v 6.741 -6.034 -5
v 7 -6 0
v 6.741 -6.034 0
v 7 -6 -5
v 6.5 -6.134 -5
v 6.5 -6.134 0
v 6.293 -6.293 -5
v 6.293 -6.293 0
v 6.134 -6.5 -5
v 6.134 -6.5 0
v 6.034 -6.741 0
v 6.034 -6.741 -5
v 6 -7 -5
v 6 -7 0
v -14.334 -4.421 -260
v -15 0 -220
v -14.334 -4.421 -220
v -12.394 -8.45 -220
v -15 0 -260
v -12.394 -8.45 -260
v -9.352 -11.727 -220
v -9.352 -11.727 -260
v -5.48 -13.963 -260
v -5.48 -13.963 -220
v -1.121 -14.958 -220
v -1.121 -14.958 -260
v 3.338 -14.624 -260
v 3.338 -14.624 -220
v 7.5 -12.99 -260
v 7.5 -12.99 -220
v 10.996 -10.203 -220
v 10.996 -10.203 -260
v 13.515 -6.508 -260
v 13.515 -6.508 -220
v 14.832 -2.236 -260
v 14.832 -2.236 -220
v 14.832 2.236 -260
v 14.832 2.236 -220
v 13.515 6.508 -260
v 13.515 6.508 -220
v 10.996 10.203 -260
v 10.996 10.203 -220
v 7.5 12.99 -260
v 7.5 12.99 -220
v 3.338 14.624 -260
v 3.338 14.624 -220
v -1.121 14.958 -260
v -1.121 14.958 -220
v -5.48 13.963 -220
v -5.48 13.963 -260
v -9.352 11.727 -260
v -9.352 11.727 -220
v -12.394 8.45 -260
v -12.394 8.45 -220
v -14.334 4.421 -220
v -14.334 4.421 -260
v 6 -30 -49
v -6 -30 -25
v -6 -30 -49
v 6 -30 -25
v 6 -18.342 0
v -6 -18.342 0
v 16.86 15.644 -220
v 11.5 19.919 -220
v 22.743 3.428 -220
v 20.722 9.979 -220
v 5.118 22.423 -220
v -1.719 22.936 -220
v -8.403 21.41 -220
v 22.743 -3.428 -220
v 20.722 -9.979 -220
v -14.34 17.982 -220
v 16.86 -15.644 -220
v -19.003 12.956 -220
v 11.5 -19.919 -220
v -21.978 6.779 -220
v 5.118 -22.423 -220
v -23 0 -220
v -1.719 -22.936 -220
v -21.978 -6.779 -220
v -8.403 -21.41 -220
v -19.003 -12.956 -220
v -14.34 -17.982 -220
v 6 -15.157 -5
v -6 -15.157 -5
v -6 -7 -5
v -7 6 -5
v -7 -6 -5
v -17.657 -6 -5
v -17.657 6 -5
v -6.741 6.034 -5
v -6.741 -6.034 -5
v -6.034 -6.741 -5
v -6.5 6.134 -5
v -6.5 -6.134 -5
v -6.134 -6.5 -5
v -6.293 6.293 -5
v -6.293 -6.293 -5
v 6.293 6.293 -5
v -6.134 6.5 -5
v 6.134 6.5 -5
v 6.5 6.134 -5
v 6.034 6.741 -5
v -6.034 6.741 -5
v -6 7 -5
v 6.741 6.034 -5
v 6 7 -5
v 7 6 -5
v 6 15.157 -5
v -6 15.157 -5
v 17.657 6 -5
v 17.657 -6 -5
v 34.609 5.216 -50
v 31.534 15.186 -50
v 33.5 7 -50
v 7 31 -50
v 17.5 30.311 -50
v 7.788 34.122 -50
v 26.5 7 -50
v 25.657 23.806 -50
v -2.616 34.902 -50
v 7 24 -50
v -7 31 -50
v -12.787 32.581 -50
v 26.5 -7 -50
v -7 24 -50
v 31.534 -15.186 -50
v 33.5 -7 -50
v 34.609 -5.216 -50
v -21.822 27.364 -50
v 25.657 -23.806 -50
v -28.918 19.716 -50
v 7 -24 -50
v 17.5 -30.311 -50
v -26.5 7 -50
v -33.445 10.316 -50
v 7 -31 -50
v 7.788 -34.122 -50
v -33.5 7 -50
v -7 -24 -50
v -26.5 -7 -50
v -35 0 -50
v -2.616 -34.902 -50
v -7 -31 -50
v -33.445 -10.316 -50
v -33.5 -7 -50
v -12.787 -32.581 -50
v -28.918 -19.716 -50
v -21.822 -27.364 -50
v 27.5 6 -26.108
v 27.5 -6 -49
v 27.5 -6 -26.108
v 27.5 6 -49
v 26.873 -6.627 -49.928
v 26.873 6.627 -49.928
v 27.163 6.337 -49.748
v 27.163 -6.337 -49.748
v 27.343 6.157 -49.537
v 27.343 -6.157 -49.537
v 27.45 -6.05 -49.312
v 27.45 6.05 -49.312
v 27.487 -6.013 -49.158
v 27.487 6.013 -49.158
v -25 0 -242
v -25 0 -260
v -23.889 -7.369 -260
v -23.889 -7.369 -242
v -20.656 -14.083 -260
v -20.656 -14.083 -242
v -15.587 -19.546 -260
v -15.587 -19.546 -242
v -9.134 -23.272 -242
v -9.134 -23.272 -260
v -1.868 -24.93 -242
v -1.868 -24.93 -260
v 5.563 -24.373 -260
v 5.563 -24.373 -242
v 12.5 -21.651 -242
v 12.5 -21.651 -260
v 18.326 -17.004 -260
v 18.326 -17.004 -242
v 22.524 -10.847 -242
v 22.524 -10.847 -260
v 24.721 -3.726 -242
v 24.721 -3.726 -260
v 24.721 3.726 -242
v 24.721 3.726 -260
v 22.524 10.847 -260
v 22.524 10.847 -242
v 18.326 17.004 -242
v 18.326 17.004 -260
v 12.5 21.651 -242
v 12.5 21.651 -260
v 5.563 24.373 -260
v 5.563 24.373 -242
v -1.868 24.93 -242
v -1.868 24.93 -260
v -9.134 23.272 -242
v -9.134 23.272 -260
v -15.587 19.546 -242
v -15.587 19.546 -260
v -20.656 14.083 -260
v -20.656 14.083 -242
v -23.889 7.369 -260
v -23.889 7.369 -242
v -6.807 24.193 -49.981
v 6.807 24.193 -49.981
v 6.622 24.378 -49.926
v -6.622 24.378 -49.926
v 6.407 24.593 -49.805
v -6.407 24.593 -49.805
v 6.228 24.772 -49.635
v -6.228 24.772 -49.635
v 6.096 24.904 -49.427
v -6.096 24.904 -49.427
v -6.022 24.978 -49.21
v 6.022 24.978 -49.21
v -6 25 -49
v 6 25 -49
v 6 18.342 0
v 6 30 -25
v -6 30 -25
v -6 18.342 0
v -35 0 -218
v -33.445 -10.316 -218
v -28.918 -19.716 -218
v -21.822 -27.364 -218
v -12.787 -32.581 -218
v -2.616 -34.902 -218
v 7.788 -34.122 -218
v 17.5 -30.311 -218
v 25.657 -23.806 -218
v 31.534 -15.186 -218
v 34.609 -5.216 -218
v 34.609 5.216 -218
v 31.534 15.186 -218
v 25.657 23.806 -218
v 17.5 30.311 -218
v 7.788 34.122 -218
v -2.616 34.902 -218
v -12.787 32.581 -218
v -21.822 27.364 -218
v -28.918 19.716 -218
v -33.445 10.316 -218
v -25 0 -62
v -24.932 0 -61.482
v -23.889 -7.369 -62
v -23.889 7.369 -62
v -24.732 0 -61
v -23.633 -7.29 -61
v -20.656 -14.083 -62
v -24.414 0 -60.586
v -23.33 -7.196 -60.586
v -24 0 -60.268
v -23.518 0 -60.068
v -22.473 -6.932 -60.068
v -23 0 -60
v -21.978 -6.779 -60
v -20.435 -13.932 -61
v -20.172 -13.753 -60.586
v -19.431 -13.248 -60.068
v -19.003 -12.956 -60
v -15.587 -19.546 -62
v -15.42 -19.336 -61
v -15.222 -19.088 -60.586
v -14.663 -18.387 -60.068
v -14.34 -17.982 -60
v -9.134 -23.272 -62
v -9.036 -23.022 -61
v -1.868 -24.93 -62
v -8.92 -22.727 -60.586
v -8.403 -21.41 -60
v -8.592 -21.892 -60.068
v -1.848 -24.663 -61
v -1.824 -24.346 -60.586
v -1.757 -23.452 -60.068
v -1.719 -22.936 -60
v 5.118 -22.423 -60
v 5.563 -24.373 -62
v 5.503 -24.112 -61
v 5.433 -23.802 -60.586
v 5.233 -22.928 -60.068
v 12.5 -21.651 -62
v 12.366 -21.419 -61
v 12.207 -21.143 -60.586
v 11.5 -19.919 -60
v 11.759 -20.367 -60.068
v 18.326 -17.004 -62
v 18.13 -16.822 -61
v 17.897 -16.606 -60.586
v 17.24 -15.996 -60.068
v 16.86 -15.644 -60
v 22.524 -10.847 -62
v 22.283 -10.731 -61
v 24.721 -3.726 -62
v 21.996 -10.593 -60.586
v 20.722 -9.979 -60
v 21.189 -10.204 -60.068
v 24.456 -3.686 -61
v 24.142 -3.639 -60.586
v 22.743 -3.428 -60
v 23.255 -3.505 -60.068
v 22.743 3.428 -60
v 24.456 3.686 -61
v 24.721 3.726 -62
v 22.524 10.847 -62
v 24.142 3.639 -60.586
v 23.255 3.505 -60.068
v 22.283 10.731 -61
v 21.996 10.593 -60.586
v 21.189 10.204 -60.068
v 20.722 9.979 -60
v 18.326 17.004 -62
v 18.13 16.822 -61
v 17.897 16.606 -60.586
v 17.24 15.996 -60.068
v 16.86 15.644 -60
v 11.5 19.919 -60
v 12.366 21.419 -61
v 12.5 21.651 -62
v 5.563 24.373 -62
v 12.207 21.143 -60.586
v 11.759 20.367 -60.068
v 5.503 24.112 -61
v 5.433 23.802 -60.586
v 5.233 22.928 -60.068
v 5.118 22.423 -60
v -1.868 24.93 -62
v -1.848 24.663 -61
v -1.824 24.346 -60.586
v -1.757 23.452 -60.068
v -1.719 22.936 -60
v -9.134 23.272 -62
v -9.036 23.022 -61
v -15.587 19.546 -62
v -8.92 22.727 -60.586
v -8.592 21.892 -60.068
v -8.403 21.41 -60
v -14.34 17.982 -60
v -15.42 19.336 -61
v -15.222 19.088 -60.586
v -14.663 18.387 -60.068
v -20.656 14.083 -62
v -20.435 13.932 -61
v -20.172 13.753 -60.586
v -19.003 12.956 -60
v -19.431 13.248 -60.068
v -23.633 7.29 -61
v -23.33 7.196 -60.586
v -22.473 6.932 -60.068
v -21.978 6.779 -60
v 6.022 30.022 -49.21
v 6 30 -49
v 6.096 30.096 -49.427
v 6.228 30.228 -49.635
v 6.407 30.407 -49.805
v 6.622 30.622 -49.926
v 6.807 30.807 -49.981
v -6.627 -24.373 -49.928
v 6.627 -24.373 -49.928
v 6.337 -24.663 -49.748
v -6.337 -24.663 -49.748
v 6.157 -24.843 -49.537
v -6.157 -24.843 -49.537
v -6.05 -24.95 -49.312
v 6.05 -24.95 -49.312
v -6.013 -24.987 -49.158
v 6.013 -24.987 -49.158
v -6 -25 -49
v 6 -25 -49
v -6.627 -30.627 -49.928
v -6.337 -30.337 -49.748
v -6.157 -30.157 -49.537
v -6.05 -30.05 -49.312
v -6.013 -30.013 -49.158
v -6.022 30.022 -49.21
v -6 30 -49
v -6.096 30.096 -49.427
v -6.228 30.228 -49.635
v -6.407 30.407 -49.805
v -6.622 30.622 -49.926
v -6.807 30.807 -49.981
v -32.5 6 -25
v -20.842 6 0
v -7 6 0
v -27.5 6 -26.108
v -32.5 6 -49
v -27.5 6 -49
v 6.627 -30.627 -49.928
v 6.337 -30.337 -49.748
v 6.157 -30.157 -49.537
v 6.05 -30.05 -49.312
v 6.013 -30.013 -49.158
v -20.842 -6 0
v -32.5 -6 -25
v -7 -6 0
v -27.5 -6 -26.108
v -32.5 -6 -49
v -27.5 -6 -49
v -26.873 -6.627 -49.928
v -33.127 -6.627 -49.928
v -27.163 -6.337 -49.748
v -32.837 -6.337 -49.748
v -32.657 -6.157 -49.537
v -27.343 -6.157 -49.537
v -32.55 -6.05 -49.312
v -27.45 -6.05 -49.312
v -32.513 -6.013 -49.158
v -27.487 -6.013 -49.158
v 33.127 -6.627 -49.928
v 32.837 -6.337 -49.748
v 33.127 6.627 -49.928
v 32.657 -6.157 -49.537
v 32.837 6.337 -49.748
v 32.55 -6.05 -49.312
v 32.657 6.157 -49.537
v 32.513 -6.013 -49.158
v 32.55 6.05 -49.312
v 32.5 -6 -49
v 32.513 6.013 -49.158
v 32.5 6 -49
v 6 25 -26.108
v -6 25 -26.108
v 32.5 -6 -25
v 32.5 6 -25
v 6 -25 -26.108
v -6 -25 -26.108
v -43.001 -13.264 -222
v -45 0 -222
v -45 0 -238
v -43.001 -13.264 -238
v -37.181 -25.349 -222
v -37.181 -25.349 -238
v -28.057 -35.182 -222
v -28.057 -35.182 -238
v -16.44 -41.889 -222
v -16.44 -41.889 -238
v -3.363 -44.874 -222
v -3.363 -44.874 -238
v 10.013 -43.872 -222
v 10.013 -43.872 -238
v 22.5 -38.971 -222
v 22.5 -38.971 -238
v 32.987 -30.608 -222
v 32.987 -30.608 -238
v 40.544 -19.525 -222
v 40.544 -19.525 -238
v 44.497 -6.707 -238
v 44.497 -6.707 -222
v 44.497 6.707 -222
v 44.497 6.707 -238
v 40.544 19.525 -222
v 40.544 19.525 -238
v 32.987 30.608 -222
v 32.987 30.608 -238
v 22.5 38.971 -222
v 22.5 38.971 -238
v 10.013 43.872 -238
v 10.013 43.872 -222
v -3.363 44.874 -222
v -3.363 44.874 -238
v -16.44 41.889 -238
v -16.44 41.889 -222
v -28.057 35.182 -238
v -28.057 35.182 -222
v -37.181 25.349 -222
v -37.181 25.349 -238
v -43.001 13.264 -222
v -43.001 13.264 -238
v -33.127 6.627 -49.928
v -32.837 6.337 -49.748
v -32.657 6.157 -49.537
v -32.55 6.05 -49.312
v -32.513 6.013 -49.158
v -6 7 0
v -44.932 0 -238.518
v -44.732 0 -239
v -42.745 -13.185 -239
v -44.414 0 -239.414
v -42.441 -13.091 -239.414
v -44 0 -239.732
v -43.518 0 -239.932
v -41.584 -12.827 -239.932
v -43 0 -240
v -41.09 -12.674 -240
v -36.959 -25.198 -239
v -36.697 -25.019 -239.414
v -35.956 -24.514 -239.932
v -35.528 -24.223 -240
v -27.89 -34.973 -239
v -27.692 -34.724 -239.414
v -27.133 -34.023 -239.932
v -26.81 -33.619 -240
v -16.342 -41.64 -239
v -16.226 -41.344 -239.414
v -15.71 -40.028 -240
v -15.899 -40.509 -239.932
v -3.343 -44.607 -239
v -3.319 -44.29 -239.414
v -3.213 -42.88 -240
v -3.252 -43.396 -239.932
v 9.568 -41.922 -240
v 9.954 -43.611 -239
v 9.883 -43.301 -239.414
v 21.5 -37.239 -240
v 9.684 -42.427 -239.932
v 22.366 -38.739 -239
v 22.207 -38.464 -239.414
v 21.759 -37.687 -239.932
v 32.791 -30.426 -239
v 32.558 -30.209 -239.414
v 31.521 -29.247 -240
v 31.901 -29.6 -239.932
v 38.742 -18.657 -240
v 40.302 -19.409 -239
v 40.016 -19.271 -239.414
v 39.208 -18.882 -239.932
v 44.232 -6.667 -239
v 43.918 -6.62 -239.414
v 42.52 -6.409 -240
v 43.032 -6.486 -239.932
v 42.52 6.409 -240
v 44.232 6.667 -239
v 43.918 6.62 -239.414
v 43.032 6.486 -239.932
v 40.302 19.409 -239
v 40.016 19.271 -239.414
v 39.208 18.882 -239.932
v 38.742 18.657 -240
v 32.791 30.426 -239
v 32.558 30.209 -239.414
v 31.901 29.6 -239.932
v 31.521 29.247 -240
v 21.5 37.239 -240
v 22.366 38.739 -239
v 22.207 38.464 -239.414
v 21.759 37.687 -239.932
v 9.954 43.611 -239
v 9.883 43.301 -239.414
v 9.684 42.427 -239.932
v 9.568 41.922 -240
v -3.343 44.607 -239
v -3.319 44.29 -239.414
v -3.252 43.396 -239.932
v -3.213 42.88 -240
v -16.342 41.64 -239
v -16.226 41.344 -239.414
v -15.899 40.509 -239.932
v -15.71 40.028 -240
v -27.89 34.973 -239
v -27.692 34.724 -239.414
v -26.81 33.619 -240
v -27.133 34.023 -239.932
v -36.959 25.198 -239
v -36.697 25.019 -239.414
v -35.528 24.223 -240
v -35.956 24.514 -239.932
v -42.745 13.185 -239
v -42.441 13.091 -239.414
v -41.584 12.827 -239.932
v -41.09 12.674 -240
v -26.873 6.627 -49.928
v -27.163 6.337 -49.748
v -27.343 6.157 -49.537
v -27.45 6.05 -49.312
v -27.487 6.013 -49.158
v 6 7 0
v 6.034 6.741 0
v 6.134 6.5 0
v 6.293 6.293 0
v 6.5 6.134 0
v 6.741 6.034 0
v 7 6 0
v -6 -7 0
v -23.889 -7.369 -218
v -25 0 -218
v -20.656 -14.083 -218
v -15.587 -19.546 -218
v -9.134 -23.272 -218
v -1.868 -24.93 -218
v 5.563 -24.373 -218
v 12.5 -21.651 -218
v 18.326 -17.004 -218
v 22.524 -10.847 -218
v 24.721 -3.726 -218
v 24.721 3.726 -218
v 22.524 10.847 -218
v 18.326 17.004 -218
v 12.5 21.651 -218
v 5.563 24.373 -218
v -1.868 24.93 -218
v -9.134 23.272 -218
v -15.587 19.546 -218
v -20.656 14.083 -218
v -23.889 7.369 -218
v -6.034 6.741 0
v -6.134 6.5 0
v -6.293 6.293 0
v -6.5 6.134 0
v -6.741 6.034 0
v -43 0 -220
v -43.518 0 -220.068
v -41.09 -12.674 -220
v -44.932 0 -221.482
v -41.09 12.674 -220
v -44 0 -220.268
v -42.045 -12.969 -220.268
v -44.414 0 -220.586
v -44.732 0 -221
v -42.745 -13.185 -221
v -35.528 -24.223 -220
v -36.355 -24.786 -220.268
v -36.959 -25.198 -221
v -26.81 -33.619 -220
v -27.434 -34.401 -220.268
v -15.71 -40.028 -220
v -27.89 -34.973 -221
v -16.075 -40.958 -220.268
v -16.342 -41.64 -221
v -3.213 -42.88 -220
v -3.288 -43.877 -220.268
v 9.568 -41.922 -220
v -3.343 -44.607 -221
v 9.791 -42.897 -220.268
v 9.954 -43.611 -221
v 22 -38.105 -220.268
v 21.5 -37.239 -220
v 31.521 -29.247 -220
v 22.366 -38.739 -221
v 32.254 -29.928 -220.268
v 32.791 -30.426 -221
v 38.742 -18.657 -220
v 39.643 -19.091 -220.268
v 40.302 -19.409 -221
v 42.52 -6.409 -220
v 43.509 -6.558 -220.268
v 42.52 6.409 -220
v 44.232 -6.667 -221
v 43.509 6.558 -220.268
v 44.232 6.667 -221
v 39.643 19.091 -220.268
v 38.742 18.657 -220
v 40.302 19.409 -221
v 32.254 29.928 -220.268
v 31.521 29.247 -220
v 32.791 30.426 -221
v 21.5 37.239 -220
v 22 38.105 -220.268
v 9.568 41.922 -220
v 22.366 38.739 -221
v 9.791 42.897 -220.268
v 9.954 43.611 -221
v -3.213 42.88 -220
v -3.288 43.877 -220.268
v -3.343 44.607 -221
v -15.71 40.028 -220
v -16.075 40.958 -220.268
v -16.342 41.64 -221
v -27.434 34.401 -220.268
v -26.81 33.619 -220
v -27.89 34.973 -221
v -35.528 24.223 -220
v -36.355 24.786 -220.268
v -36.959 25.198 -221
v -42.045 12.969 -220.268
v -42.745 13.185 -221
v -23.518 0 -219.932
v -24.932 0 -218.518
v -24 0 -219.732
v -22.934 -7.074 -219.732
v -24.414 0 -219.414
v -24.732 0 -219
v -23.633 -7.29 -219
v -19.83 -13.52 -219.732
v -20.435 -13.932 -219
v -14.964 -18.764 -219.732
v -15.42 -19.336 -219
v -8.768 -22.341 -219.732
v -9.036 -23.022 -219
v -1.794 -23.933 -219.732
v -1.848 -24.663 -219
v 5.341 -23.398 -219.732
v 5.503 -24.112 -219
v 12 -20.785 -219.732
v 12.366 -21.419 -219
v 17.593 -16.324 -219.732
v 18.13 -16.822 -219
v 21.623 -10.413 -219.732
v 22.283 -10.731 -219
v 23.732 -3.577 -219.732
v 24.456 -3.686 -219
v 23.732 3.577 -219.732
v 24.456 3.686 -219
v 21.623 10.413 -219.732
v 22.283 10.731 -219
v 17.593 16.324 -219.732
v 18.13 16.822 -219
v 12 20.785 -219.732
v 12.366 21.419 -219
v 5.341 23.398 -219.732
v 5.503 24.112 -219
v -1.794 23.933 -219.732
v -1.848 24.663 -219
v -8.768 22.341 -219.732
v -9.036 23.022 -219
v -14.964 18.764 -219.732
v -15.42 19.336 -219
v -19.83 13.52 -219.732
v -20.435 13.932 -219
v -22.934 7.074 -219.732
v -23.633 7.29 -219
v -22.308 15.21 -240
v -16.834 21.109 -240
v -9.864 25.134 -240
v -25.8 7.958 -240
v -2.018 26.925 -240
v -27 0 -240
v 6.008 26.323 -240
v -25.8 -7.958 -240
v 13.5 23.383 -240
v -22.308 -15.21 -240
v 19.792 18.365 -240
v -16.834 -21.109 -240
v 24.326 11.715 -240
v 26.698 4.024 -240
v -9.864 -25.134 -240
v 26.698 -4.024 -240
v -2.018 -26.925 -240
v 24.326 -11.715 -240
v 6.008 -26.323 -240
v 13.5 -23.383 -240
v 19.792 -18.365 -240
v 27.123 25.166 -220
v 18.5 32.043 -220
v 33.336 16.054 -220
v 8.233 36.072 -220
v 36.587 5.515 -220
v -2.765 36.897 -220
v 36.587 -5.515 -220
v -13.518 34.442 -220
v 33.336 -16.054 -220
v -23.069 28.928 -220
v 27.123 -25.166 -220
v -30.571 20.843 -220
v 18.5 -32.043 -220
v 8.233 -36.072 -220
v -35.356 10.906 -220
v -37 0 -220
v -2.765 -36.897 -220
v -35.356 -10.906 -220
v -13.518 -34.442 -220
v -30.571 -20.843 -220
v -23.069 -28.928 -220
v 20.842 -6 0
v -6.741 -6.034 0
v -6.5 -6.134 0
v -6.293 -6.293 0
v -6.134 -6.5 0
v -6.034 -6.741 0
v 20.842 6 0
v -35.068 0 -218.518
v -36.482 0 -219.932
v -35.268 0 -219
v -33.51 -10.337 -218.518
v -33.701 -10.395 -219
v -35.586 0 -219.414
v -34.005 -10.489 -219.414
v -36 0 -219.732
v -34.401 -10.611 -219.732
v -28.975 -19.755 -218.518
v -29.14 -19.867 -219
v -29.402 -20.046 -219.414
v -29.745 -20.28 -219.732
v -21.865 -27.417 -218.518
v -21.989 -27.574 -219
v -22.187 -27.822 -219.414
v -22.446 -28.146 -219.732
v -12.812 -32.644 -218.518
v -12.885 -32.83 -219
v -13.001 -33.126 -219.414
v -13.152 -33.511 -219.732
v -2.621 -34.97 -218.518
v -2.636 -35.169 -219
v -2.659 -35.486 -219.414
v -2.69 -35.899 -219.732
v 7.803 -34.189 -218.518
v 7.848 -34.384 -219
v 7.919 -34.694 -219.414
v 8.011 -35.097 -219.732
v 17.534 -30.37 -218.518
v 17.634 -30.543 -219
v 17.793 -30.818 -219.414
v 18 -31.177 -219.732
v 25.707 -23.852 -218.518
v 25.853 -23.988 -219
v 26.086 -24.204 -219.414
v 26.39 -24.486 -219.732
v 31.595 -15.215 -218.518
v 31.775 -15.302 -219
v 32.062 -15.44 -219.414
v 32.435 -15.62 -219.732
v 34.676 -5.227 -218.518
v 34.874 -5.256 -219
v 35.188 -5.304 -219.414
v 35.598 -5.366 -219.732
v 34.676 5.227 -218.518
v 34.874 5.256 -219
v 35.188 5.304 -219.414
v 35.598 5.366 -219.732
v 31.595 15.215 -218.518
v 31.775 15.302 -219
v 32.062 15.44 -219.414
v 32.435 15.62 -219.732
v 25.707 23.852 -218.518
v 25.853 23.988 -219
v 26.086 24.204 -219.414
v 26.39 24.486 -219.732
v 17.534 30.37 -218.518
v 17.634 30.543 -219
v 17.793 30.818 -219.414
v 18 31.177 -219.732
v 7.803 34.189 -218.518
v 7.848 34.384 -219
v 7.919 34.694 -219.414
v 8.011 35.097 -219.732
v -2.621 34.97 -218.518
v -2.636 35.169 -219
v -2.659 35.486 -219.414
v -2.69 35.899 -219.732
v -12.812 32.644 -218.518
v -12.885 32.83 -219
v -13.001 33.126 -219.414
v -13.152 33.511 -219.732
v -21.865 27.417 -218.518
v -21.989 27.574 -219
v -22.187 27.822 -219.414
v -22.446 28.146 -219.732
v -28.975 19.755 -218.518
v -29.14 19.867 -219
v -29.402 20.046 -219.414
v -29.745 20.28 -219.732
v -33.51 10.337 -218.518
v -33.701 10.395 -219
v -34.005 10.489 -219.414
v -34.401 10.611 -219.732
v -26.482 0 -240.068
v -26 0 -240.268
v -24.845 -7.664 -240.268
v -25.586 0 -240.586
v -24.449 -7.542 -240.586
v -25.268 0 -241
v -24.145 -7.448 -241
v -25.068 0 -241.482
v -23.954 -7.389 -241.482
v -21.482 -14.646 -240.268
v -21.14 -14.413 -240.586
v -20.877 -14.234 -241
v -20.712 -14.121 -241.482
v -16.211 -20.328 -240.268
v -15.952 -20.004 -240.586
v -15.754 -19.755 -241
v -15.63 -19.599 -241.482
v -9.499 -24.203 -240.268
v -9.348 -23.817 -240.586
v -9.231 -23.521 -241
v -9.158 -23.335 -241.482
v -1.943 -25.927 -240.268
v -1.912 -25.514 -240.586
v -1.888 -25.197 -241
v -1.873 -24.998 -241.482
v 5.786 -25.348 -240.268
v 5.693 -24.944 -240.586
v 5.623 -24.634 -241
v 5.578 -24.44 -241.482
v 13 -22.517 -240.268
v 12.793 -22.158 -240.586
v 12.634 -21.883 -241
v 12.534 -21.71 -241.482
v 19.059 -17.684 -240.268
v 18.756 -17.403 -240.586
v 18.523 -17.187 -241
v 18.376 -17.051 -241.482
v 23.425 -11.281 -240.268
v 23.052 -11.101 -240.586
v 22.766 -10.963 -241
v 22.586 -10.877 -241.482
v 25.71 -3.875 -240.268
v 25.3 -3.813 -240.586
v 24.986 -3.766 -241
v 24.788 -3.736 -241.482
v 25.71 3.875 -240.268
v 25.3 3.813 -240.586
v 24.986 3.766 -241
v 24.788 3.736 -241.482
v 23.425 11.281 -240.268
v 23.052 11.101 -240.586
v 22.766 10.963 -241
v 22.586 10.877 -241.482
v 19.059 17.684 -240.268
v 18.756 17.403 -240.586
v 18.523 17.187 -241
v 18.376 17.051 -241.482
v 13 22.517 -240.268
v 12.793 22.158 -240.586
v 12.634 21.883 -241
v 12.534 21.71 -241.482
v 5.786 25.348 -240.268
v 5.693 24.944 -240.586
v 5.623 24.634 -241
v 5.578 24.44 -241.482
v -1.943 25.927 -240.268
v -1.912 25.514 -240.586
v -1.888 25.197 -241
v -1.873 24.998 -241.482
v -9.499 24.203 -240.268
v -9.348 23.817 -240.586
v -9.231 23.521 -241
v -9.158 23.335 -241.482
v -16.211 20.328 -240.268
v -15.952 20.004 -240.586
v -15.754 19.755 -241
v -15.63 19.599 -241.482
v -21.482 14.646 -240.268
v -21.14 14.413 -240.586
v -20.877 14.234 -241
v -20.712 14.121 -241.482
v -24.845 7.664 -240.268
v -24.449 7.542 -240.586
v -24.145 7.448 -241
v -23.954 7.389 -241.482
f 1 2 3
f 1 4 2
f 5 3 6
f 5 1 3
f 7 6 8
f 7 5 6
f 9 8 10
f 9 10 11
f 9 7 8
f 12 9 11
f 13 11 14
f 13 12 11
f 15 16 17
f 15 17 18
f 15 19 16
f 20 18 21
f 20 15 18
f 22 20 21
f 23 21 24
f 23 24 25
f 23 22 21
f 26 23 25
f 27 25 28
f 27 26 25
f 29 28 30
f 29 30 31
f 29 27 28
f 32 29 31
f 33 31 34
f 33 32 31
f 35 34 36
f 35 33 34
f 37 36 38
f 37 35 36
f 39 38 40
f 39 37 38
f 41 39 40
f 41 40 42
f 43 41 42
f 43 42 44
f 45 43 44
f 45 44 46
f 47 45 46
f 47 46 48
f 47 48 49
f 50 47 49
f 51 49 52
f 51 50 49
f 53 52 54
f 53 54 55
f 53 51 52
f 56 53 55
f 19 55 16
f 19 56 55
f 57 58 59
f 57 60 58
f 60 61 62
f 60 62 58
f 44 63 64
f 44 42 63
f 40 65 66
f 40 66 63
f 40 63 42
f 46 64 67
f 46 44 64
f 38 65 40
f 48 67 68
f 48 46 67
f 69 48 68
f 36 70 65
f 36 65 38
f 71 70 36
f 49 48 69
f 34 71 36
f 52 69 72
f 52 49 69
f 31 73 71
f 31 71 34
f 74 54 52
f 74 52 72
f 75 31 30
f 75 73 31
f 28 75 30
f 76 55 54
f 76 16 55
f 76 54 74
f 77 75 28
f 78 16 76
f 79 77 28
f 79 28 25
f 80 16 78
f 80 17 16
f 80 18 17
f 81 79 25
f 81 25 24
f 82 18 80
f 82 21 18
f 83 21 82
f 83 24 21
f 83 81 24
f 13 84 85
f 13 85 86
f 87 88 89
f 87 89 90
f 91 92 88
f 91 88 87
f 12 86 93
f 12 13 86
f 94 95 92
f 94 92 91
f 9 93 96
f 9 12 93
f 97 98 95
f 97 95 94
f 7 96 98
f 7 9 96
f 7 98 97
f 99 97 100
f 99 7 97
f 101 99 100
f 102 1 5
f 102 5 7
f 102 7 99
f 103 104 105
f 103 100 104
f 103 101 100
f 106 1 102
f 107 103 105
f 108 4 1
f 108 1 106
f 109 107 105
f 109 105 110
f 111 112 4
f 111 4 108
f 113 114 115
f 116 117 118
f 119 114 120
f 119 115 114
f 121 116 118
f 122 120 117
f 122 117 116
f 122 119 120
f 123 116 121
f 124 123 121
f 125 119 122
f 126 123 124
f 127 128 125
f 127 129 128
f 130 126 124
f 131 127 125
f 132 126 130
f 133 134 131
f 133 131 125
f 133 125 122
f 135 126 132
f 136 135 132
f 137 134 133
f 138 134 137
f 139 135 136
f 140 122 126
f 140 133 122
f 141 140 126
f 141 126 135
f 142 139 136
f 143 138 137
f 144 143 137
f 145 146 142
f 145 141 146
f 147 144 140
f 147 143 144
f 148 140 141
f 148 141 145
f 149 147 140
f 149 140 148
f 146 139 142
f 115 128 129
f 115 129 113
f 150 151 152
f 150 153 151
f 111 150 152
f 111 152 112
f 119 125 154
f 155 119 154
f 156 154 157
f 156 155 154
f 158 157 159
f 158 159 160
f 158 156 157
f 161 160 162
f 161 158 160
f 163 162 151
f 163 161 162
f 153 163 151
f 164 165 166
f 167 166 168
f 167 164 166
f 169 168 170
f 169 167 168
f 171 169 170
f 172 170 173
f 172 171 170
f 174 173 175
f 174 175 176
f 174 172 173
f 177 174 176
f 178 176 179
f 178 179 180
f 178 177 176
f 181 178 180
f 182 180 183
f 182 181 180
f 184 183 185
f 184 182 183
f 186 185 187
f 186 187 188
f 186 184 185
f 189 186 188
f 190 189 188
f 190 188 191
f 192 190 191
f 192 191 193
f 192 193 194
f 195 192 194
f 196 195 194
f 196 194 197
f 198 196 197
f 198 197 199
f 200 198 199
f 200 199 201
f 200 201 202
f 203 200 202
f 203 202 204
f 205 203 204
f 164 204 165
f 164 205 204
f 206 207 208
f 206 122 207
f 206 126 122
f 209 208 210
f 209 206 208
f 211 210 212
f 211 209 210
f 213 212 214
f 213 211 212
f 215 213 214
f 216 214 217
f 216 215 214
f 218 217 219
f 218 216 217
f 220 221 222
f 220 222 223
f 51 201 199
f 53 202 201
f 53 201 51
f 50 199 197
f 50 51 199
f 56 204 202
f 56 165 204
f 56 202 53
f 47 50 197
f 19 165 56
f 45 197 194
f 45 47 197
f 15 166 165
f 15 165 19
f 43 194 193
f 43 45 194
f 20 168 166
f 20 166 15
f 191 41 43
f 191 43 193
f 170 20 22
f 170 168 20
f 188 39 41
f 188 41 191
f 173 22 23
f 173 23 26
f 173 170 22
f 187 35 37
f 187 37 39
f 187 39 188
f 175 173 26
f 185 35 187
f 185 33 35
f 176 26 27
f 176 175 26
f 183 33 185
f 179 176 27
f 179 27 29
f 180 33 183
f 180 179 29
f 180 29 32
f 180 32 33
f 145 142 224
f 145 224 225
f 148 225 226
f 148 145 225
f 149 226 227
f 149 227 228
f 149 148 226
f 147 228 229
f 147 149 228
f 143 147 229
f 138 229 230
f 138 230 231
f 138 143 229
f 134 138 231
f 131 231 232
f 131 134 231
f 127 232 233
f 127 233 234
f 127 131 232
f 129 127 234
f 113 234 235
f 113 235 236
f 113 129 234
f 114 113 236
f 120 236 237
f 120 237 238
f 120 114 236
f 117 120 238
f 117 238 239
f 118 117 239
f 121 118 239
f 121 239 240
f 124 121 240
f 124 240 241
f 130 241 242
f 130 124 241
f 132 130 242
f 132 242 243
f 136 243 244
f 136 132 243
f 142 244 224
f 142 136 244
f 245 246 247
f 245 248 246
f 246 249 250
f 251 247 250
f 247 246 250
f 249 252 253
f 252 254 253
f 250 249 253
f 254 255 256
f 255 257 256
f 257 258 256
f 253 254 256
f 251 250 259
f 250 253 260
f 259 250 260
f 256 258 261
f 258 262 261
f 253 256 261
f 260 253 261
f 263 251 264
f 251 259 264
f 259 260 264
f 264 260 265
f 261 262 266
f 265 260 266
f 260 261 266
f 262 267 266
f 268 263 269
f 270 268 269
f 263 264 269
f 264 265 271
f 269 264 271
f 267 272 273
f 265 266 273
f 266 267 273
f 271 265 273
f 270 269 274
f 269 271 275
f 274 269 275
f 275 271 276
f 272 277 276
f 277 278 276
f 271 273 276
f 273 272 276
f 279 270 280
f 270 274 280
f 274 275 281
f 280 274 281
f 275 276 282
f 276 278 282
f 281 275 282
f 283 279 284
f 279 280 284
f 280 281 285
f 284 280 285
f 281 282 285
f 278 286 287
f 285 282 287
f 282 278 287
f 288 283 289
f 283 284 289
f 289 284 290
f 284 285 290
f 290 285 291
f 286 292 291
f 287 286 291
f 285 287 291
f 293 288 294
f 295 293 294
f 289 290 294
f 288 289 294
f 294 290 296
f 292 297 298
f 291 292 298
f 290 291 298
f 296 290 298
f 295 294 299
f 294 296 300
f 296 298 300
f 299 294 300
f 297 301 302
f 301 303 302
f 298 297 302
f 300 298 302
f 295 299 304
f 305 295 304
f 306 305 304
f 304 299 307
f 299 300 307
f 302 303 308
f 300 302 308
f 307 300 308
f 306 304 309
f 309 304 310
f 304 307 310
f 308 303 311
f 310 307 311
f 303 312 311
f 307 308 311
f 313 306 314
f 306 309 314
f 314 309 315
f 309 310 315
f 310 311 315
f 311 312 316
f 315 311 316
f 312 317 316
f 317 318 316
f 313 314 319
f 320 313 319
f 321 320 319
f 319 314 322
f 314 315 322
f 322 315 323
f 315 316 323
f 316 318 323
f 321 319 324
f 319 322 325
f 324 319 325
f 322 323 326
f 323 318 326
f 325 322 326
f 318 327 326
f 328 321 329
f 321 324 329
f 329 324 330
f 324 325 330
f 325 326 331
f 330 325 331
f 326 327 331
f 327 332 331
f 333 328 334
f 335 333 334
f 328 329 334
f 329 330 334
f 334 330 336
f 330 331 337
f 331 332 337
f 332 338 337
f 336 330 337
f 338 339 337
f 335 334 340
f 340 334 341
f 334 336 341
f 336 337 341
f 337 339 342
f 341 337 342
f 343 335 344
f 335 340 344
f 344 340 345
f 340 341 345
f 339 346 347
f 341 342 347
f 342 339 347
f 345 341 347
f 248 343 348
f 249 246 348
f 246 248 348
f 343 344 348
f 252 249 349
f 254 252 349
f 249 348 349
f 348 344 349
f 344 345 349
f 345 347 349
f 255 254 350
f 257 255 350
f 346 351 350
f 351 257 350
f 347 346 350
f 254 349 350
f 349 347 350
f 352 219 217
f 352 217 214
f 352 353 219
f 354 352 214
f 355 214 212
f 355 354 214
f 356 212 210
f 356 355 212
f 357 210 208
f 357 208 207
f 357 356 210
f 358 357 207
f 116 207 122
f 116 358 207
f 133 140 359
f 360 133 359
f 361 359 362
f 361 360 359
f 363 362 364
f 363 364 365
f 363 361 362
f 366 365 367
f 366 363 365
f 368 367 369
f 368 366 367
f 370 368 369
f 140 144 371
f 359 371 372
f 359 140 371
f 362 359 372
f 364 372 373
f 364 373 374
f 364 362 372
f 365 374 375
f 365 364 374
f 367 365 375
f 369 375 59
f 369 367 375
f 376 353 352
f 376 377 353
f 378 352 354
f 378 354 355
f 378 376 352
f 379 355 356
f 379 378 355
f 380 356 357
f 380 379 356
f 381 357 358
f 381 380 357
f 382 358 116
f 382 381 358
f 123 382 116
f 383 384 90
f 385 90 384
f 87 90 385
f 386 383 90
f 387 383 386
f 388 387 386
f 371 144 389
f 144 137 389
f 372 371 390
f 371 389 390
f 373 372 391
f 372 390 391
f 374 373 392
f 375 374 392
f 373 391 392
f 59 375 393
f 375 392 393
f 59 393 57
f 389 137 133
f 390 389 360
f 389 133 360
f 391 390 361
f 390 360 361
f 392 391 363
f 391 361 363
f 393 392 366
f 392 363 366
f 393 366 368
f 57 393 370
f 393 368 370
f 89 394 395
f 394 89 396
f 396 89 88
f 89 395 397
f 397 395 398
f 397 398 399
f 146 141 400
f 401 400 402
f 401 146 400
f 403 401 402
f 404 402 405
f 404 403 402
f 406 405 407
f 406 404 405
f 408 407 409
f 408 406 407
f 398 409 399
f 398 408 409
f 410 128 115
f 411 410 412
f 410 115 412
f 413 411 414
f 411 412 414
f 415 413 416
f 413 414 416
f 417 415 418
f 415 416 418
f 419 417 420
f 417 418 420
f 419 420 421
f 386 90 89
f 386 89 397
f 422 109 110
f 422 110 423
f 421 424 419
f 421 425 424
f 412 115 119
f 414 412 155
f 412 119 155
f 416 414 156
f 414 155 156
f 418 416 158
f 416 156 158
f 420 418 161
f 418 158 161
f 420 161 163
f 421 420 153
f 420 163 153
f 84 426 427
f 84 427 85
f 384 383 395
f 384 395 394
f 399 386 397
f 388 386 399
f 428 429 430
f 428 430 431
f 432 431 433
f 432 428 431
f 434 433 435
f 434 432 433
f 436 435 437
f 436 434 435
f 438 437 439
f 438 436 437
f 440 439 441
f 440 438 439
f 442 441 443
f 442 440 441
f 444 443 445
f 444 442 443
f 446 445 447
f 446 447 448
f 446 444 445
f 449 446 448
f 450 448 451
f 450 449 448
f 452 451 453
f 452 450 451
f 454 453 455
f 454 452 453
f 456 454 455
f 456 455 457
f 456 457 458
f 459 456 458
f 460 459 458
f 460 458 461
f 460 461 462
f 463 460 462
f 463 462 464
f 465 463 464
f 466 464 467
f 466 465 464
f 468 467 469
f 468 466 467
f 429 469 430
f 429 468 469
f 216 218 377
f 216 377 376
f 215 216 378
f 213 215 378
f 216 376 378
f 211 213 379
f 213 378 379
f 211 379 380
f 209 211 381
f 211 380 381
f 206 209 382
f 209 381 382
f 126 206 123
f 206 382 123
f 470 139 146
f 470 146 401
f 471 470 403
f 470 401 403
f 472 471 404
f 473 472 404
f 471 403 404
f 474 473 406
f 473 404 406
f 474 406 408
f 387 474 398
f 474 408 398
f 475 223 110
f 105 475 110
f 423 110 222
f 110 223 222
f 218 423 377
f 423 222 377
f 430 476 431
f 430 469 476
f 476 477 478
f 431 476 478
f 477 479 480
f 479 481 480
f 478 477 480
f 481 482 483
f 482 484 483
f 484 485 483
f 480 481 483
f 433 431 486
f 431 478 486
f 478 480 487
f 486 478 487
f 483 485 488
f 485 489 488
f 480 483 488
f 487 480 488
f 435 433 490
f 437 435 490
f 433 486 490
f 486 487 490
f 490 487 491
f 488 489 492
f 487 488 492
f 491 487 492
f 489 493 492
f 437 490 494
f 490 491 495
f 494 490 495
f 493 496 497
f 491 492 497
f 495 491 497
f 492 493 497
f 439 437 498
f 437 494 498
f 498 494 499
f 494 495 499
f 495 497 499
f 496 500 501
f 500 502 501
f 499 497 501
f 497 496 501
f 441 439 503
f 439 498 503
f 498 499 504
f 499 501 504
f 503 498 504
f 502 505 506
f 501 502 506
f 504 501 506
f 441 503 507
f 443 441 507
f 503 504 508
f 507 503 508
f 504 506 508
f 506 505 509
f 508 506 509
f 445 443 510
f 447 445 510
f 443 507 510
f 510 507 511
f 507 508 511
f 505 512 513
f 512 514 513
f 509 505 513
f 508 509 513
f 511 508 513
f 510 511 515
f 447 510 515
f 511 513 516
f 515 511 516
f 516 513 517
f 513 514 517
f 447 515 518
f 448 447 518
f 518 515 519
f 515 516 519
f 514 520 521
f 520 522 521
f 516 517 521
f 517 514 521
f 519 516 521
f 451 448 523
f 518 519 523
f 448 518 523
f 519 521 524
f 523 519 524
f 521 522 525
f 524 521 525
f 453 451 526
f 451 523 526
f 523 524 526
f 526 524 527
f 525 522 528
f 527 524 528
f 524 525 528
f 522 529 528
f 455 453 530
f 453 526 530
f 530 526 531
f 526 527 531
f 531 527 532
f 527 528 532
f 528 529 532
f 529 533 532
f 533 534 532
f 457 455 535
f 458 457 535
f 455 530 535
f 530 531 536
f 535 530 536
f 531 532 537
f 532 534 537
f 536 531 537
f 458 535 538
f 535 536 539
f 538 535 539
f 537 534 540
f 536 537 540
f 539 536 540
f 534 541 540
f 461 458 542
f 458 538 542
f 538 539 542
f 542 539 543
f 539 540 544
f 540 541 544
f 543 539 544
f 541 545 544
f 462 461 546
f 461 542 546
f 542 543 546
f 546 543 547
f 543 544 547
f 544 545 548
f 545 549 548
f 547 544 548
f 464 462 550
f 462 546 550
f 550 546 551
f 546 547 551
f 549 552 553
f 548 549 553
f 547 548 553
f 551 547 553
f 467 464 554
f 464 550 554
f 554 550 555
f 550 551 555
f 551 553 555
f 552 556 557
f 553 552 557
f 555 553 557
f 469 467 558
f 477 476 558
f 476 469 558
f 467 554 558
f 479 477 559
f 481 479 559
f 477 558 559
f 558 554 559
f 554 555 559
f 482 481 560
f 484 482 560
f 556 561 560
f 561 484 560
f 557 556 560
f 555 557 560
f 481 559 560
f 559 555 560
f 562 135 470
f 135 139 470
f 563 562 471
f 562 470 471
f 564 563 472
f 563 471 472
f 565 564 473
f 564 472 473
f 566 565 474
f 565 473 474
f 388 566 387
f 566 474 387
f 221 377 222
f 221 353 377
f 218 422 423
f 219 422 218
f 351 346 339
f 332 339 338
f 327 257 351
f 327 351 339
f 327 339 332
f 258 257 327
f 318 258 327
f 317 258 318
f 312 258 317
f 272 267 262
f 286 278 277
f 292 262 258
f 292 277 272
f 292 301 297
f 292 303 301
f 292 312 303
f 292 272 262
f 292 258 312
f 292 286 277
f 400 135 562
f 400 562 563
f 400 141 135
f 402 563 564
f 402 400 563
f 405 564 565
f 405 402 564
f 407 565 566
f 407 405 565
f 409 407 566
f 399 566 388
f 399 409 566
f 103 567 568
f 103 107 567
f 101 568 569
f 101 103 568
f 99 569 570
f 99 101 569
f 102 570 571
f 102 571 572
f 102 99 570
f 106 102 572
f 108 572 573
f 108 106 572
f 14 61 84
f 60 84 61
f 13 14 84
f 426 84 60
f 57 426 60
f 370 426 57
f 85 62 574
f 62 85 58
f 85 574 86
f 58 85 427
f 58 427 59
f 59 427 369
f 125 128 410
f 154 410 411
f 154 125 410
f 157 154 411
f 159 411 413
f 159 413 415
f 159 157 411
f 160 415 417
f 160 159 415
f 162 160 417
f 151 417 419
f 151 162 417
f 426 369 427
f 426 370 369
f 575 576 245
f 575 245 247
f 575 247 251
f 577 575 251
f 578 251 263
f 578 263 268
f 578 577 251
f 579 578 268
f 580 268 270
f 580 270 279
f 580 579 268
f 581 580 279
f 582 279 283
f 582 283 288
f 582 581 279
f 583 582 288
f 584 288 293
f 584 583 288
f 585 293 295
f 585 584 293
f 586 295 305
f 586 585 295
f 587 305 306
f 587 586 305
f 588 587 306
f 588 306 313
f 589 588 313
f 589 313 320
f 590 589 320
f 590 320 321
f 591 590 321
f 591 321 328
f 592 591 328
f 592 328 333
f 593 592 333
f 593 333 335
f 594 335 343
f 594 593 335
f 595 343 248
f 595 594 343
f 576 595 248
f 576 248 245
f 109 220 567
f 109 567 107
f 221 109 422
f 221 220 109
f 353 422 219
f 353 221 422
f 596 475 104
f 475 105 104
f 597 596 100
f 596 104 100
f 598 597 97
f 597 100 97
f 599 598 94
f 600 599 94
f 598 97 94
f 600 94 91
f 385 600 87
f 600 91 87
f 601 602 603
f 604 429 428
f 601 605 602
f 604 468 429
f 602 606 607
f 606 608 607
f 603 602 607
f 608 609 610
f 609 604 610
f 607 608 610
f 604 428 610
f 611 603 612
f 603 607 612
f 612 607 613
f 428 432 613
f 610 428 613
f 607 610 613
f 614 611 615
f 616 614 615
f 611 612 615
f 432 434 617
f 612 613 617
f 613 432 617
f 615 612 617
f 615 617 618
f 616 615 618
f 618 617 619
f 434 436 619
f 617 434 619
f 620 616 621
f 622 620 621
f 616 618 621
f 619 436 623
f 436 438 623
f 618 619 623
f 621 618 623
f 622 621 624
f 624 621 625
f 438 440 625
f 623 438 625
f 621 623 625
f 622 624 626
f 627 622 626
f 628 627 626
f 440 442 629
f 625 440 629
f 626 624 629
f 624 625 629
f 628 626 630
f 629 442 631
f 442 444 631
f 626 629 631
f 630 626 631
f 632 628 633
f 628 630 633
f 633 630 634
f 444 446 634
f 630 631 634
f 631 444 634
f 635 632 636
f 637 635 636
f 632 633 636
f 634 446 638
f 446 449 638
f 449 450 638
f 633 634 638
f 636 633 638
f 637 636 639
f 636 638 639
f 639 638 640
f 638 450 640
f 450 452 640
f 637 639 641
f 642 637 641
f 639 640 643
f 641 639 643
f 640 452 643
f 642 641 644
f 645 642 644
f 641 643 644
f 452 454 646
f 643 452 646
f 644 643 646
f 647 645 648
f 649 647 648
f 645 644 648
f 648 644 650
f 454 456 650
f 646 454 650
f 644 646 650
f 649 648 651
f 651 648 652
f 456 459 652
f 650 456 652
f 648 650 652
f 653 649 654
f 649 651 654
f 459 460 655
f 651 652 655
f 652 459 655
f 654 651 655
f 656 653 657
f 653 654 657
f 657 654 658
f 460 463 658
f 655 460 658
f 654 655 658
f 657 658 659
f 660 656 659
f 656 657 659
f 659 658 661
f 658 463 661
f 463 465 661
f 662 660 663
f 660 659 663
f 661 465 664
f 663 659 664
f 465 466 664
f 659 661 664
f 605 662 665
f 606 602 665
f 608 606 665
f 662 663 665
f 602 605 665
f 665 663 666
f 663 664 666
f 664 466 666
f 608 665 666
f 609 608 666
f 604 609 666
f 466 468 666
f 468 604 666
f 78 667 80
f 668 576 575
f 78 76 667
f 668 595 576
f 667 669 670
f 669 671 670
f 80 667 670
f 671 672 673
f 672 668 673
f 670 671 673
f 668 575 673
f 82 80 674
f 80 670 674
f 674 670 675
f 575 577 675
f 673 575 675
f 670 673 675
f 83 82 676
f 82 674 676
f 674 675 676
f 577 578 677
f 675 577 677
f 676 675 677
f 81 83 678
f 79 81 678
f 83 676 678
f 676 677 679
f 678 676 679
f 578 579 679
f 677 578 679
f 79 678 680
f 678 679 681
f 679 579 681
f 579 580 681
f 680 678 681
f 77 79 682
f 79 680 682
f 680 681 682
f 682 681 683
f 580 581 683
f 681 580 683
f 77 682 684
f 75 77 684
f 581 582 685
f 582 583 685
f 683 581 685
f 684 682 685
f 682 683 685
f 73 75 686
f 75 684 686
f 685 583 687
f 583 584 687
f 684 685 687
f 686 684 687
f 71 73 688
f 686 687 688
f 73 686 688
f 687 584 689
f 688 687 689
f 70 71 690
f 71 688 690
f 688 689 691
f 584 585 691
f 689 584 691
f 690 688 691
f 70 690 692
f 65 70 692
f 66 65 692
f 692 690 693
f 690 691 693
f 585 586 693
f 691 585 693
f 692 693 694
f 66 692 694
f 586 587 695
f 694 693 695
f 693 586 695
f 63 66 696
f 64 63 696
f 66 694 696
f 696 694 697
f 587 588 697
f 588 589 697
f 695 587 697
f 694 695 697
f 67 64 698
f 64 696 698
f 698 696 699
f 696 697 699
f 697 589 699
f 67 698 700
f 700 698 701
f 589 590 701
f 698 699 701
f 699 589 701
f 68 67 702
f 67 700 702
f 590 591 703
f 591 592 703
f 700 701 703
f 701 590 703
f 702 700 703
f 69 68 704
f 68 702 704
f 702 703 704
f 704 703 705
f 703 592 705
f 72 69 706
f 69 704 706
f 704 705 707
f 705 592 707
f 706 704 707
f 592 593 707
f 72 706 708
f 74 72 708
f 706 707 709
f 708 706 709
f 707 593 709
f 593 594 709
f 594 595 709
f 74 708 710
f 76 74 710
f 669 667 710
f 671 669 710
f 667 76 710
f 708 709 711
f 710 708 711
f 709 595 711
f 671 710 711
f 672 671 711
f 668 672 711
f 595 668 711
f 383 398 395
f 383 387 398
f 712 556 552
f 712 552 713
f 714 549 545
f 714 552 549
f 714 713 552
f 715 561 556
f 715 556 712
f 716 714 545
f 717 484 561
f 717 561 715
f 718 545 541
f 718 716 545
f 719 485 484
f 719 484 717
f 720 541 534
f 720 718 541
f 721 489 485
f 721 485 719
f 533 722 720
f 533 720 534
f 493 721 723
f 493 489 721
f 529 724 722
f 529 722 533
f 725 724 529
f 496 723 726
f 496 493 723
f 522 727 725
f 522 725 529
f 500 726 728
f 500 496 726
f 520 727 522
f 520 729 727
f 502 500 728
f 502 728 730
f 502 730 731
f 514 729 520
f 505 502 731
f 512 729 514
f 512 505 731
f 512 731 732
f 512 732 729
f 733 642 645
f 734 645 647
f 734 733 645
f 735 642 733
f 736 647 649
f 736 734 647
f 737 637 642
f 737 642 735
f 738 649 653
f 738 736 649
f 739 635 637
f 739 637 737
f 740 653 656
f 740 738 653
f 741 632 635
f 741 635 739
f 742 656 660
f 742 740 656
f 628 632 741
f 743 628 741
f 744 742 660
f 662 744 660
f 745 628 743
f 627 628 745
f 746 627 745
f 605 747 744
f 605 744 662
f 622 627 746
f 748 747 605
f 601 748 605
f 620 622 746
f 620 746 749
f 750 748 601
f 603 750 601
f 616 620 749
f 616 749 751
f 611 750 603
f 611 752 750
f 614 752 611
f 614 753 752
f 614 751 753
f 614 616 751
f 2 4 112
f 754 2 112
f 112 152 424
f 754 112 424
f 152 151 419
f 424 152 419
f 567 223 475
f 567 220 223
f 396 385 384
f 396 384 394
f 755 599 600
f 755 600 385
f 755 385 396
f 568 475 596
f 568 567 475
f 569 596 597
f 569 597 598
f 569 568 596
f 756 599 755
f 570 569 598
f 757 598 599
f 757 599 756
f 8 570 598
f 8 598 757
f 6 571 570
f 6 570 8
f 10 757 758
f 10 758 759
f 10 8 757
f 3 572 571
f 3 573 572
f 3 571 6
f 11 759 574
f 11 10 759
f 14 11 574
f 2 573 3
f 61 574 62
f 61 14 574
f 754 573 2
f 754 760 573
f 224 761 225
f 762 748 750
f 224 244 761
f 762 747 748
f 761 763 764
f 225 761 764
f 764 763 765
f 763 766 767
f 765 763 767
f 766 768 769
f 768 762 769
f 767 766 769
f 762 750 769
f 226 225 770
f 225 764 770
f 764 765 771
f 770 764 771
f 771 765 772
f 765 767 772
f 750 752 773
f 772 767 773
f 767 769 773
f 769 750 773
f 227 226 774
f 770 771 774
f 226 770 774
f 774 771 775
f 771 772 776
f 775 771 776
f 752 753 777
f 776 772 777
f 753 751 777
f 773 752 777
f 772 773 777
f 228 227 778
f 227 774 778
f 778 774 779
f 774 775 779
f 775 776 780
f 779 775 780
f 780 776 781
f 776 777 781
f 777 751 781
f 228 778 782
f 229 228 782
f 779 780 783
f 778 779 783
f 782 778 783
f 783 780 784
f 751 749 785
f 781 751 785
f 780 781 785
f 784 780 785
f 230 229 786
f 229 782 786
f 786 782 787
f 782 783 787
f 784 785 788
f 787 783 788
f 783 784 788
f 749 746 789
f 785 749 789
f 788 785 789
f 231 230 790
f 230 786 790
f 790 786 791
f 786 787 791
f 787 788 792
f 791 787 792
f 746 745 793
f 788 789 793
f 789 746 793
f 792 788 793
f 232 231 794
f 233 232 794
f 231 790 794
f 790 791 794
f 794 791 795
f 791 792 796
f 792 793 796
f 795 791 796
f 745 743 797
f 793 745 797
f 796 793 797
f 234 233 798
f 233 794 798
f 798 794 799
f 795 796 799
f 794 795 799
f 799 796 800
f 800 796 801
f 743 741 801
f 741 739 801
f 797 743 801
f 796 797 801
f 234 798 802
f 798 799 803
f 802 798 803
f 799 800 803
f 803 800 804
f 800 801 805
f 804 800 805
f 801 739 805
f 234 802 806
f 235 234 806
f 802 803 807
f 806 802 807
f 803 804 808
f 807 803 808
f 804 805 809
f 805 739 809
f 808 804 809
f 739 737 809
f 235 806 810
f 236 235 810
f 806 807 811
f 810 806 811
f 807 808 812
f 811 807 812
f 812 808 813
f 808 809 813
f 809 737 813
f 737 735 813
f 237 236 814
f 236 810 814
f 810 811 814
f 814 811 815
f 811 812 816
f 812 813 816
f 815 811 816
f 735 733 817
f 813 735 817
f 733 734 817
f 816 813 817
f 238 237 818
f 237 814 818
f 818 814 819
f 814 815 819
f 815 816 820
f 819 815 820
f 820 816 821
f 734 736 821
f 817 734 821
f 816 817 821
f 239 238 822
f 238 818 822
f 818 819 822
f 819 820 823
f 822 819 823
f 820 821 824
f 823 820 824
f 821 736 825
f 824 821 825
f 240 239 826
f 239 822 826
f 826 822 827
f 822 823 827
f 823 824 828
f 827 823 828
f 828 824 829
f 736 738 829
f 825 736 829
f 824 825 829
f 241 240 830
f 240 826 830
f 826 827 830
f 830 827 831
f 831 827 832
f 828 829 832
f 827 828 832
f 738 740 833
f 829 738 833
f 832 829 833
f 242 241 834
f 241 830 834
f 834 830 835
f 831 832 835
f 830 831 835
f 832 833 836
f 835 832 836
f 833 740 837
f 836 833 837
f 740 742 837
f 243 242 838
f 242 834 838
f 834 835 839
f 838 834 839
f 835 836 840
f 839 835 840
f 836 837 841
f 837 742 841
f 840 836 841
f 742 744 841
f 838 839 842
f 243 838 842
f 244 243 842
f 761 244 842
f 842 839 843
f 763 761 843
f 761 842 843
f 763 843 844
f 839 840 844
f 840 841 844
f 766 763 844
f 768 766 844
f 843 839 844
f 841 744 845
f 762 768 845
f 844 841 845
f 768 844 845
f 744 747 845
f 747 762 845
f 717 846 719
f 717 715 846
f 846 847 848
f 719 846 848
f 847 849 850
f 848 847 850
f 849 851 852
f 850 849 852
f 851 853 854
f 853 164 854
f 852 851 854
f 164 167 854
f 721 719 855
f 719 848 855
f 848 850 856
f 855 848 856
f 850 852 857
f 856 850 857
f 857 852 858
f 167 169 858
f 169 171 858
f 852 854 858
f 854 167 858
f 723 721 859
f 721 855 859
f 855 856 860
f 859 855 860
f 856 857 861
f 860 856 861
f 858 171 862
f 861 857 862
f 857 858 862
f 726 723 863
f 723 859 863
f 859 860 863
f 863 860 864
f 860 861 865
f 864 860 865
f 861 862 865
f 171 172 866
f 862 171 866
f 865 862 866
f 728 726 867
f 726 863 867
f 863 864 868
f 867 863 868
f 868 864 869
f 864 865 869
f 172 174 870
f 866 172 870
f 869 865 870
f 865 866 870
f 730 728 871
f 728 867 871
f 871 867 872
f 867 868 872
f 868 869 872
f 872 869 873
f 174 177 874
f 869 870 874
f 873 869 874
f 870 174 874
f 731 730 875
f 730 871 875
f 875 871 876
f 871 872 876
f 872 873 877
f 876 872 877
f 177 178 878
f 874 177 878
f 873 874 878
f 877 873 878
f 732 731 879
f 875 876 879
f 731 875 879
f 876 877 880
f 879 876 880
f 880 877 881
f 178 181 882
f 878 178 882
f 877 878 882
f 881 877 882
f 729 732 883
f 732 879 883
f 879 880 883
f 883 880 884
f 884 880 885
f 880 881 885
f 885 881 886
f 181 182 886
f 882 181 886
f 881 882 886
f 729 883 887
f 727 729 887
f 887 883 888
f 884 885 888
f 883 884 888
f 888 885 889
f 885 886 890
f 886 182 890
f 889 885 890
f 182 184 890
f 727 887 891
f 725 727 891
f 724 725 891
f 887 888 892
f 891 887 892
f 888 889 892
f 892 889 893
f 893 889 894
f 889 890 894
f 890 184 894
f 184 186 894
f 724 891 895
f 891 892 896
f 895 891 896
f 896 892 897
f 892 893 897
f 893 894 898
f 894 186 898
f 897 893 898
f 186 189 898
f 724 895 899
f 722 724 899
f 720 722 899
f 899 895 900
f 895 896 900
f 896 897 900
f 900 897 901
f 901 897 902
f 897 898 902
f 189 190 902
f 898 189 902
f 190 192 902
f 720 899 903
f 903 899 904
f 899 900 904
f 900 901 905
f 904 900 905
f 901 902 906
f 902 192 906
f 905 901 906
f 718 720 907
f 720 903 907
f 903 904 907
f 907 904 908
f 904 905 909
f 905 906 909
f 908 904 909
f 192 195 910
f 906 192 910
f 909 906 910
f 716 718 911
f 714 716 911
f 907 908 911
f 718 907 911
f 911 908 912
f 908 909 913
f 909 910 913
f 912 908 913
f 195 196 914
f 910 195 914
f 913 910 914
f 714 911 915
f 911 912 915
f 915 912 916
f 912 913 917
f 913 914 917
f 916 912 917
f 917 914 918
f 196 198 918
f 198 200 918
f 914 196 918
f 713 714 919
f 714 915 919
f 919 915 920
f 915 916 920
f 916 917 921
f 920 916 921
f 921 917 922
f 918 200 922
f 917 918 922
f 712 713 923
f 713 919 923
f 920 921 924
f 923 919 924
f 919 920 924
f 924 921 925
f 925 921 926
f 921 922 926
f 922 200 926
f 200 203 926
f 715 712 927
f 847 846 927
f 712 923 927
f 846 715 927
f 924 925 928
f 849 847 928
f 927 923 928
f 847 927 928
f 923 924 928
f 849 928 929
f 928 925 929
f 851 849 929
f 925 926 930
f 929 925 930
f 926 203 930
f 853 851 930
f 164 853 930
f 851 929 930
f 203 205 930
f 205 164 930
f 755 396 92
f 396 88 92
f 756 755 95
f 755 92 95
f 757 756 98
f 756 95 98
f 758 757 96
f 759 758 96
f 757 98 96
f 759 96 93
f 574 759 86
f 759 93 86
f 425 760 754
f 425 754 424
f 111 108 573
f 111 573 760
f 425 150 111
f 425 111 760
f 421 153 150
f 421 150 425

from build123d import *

# Parameters (mm, degrees)
BOSS_EXTRUDE1_DEPTH = 6
BOSS_EXTRUDE2_DEPTH = 6
FILLET2_R           = 1
FILLET3_R           = 2
FILLET4_R           = 2


with BuildPart() as part:
    # Sketch1 → Revolve1 (revolve)
    with BuildSketch(Plane(origin=(0, 0, 0), x_dir=(1, 0, 0), z_dir=(0, 1, 0))):
        Polygon((0, 260), (-25, 260), (-25, 240), (-45, 240), (-45, 220), (-35, 220), (-35, 50), (0, 50), align=None)
    revolve(axis=Axis((0, 0, -296.761273665), (0, 0, 1)))

    # Sketch5 → Boss-Extrude1 (add, symmetric)
    with BuildSketch(Plane(origin=(0, 0, 0), x_dir=(1, 0, 0), z_dir=(0, 1, 0))):
        Polygon((-32.5, 50), (-32.5, 25), (-20.842308546, 0), (20.842308546, 0), (32.5, 25), (32.5, 50), (27.5, 50), (27.5, 26.108473313), (17.656957242, 5), (-17.656957242, 5), (-27.5, 26.108473313), (-27.5, 50), align=None)
    extrude(amount=BOSS_EXTRUDE1_DEPTH, both=True)

    # Sketch7 → Boss-Extrude2 (add, symmetric)
    with BuildSketch(Plane(origin=(0, 0, 0), x_dir=(0, 0, -1), z_dir=(1, 0, 0))):
        Polygon((50, 30), (25, 30), (0, 18.342308546), (0, -18.342308546), (25, -30), (50, -30), (50, -25), (26.108473313, -25), (5, -15.156957242), (5, 15.156957242), (26.108473313, 25), (50, 25), align=None)
    extrude(amount=BOSS_EXTRUDE2_DEPTH, both=True)

    # Sketch8 → Cut-Revolve1 (revolve, cut)
    with BuildSketch(Plane(origin=(0, 0, 0), x_dir=(1, 0, 0), z_dir=(0, 1, 0))):
        Polygon((-25, 220), (-15, 220), (-15, 260), (0, 260), (0, 60), (-25, 60), align=None)
    revolve(axis=Axis((0, 0, -287.049474382), (0, 0, 1)), mode=Mode.SUBTRACT)

    # Fillet2
    fillet2_edges = [part.edges().sort_by_distance(p)[0] for p in [
        (-30, -6, -50),
        (-27.5, 0, -50),
        (-32.5, 0, -50),
        (30, -6, -50),
        (32.5, 0, -50),
        (27.5, 0, -50),
        (-30, 6, -50),
        (30, 6, -50),
        (-6, -6, -2.5),
        (6, -6, -2.5),
        (6, 6, -2.5),
        (6, 27.5, -50),
        (-6, 6, -2.5),
        (-6, 27.5, -50),
        (0, 25, -50),
        (0, 30, -50),
        (-6, -27.5, -50),
        (0, -30, -50),
        (0, -25, -50),
        (6, -27.5, -50),
    ]]
    fillet(fillet2_edges, radius=FILLET2_R)

    # Fillet3
    fillet3_edges = [part.edges().sort_by_distance(p)[0] for p in [
        (35, 0, -220),
        (25, 0, -240),
    ]]
    fillet(fillet3_edges, radius=FILLET3_R)

    # Fillet4
    fillet4_edges = [part.edges().sort_by_distance(p)[0] for p in [
        (25, 0, -60),
        (25, 0, -220),
        (45, 0, -220),
        (45, 0, -240),
    ]]
    fillet(fillet4_edges, radius=FILLET4_R)


solid = part.part
